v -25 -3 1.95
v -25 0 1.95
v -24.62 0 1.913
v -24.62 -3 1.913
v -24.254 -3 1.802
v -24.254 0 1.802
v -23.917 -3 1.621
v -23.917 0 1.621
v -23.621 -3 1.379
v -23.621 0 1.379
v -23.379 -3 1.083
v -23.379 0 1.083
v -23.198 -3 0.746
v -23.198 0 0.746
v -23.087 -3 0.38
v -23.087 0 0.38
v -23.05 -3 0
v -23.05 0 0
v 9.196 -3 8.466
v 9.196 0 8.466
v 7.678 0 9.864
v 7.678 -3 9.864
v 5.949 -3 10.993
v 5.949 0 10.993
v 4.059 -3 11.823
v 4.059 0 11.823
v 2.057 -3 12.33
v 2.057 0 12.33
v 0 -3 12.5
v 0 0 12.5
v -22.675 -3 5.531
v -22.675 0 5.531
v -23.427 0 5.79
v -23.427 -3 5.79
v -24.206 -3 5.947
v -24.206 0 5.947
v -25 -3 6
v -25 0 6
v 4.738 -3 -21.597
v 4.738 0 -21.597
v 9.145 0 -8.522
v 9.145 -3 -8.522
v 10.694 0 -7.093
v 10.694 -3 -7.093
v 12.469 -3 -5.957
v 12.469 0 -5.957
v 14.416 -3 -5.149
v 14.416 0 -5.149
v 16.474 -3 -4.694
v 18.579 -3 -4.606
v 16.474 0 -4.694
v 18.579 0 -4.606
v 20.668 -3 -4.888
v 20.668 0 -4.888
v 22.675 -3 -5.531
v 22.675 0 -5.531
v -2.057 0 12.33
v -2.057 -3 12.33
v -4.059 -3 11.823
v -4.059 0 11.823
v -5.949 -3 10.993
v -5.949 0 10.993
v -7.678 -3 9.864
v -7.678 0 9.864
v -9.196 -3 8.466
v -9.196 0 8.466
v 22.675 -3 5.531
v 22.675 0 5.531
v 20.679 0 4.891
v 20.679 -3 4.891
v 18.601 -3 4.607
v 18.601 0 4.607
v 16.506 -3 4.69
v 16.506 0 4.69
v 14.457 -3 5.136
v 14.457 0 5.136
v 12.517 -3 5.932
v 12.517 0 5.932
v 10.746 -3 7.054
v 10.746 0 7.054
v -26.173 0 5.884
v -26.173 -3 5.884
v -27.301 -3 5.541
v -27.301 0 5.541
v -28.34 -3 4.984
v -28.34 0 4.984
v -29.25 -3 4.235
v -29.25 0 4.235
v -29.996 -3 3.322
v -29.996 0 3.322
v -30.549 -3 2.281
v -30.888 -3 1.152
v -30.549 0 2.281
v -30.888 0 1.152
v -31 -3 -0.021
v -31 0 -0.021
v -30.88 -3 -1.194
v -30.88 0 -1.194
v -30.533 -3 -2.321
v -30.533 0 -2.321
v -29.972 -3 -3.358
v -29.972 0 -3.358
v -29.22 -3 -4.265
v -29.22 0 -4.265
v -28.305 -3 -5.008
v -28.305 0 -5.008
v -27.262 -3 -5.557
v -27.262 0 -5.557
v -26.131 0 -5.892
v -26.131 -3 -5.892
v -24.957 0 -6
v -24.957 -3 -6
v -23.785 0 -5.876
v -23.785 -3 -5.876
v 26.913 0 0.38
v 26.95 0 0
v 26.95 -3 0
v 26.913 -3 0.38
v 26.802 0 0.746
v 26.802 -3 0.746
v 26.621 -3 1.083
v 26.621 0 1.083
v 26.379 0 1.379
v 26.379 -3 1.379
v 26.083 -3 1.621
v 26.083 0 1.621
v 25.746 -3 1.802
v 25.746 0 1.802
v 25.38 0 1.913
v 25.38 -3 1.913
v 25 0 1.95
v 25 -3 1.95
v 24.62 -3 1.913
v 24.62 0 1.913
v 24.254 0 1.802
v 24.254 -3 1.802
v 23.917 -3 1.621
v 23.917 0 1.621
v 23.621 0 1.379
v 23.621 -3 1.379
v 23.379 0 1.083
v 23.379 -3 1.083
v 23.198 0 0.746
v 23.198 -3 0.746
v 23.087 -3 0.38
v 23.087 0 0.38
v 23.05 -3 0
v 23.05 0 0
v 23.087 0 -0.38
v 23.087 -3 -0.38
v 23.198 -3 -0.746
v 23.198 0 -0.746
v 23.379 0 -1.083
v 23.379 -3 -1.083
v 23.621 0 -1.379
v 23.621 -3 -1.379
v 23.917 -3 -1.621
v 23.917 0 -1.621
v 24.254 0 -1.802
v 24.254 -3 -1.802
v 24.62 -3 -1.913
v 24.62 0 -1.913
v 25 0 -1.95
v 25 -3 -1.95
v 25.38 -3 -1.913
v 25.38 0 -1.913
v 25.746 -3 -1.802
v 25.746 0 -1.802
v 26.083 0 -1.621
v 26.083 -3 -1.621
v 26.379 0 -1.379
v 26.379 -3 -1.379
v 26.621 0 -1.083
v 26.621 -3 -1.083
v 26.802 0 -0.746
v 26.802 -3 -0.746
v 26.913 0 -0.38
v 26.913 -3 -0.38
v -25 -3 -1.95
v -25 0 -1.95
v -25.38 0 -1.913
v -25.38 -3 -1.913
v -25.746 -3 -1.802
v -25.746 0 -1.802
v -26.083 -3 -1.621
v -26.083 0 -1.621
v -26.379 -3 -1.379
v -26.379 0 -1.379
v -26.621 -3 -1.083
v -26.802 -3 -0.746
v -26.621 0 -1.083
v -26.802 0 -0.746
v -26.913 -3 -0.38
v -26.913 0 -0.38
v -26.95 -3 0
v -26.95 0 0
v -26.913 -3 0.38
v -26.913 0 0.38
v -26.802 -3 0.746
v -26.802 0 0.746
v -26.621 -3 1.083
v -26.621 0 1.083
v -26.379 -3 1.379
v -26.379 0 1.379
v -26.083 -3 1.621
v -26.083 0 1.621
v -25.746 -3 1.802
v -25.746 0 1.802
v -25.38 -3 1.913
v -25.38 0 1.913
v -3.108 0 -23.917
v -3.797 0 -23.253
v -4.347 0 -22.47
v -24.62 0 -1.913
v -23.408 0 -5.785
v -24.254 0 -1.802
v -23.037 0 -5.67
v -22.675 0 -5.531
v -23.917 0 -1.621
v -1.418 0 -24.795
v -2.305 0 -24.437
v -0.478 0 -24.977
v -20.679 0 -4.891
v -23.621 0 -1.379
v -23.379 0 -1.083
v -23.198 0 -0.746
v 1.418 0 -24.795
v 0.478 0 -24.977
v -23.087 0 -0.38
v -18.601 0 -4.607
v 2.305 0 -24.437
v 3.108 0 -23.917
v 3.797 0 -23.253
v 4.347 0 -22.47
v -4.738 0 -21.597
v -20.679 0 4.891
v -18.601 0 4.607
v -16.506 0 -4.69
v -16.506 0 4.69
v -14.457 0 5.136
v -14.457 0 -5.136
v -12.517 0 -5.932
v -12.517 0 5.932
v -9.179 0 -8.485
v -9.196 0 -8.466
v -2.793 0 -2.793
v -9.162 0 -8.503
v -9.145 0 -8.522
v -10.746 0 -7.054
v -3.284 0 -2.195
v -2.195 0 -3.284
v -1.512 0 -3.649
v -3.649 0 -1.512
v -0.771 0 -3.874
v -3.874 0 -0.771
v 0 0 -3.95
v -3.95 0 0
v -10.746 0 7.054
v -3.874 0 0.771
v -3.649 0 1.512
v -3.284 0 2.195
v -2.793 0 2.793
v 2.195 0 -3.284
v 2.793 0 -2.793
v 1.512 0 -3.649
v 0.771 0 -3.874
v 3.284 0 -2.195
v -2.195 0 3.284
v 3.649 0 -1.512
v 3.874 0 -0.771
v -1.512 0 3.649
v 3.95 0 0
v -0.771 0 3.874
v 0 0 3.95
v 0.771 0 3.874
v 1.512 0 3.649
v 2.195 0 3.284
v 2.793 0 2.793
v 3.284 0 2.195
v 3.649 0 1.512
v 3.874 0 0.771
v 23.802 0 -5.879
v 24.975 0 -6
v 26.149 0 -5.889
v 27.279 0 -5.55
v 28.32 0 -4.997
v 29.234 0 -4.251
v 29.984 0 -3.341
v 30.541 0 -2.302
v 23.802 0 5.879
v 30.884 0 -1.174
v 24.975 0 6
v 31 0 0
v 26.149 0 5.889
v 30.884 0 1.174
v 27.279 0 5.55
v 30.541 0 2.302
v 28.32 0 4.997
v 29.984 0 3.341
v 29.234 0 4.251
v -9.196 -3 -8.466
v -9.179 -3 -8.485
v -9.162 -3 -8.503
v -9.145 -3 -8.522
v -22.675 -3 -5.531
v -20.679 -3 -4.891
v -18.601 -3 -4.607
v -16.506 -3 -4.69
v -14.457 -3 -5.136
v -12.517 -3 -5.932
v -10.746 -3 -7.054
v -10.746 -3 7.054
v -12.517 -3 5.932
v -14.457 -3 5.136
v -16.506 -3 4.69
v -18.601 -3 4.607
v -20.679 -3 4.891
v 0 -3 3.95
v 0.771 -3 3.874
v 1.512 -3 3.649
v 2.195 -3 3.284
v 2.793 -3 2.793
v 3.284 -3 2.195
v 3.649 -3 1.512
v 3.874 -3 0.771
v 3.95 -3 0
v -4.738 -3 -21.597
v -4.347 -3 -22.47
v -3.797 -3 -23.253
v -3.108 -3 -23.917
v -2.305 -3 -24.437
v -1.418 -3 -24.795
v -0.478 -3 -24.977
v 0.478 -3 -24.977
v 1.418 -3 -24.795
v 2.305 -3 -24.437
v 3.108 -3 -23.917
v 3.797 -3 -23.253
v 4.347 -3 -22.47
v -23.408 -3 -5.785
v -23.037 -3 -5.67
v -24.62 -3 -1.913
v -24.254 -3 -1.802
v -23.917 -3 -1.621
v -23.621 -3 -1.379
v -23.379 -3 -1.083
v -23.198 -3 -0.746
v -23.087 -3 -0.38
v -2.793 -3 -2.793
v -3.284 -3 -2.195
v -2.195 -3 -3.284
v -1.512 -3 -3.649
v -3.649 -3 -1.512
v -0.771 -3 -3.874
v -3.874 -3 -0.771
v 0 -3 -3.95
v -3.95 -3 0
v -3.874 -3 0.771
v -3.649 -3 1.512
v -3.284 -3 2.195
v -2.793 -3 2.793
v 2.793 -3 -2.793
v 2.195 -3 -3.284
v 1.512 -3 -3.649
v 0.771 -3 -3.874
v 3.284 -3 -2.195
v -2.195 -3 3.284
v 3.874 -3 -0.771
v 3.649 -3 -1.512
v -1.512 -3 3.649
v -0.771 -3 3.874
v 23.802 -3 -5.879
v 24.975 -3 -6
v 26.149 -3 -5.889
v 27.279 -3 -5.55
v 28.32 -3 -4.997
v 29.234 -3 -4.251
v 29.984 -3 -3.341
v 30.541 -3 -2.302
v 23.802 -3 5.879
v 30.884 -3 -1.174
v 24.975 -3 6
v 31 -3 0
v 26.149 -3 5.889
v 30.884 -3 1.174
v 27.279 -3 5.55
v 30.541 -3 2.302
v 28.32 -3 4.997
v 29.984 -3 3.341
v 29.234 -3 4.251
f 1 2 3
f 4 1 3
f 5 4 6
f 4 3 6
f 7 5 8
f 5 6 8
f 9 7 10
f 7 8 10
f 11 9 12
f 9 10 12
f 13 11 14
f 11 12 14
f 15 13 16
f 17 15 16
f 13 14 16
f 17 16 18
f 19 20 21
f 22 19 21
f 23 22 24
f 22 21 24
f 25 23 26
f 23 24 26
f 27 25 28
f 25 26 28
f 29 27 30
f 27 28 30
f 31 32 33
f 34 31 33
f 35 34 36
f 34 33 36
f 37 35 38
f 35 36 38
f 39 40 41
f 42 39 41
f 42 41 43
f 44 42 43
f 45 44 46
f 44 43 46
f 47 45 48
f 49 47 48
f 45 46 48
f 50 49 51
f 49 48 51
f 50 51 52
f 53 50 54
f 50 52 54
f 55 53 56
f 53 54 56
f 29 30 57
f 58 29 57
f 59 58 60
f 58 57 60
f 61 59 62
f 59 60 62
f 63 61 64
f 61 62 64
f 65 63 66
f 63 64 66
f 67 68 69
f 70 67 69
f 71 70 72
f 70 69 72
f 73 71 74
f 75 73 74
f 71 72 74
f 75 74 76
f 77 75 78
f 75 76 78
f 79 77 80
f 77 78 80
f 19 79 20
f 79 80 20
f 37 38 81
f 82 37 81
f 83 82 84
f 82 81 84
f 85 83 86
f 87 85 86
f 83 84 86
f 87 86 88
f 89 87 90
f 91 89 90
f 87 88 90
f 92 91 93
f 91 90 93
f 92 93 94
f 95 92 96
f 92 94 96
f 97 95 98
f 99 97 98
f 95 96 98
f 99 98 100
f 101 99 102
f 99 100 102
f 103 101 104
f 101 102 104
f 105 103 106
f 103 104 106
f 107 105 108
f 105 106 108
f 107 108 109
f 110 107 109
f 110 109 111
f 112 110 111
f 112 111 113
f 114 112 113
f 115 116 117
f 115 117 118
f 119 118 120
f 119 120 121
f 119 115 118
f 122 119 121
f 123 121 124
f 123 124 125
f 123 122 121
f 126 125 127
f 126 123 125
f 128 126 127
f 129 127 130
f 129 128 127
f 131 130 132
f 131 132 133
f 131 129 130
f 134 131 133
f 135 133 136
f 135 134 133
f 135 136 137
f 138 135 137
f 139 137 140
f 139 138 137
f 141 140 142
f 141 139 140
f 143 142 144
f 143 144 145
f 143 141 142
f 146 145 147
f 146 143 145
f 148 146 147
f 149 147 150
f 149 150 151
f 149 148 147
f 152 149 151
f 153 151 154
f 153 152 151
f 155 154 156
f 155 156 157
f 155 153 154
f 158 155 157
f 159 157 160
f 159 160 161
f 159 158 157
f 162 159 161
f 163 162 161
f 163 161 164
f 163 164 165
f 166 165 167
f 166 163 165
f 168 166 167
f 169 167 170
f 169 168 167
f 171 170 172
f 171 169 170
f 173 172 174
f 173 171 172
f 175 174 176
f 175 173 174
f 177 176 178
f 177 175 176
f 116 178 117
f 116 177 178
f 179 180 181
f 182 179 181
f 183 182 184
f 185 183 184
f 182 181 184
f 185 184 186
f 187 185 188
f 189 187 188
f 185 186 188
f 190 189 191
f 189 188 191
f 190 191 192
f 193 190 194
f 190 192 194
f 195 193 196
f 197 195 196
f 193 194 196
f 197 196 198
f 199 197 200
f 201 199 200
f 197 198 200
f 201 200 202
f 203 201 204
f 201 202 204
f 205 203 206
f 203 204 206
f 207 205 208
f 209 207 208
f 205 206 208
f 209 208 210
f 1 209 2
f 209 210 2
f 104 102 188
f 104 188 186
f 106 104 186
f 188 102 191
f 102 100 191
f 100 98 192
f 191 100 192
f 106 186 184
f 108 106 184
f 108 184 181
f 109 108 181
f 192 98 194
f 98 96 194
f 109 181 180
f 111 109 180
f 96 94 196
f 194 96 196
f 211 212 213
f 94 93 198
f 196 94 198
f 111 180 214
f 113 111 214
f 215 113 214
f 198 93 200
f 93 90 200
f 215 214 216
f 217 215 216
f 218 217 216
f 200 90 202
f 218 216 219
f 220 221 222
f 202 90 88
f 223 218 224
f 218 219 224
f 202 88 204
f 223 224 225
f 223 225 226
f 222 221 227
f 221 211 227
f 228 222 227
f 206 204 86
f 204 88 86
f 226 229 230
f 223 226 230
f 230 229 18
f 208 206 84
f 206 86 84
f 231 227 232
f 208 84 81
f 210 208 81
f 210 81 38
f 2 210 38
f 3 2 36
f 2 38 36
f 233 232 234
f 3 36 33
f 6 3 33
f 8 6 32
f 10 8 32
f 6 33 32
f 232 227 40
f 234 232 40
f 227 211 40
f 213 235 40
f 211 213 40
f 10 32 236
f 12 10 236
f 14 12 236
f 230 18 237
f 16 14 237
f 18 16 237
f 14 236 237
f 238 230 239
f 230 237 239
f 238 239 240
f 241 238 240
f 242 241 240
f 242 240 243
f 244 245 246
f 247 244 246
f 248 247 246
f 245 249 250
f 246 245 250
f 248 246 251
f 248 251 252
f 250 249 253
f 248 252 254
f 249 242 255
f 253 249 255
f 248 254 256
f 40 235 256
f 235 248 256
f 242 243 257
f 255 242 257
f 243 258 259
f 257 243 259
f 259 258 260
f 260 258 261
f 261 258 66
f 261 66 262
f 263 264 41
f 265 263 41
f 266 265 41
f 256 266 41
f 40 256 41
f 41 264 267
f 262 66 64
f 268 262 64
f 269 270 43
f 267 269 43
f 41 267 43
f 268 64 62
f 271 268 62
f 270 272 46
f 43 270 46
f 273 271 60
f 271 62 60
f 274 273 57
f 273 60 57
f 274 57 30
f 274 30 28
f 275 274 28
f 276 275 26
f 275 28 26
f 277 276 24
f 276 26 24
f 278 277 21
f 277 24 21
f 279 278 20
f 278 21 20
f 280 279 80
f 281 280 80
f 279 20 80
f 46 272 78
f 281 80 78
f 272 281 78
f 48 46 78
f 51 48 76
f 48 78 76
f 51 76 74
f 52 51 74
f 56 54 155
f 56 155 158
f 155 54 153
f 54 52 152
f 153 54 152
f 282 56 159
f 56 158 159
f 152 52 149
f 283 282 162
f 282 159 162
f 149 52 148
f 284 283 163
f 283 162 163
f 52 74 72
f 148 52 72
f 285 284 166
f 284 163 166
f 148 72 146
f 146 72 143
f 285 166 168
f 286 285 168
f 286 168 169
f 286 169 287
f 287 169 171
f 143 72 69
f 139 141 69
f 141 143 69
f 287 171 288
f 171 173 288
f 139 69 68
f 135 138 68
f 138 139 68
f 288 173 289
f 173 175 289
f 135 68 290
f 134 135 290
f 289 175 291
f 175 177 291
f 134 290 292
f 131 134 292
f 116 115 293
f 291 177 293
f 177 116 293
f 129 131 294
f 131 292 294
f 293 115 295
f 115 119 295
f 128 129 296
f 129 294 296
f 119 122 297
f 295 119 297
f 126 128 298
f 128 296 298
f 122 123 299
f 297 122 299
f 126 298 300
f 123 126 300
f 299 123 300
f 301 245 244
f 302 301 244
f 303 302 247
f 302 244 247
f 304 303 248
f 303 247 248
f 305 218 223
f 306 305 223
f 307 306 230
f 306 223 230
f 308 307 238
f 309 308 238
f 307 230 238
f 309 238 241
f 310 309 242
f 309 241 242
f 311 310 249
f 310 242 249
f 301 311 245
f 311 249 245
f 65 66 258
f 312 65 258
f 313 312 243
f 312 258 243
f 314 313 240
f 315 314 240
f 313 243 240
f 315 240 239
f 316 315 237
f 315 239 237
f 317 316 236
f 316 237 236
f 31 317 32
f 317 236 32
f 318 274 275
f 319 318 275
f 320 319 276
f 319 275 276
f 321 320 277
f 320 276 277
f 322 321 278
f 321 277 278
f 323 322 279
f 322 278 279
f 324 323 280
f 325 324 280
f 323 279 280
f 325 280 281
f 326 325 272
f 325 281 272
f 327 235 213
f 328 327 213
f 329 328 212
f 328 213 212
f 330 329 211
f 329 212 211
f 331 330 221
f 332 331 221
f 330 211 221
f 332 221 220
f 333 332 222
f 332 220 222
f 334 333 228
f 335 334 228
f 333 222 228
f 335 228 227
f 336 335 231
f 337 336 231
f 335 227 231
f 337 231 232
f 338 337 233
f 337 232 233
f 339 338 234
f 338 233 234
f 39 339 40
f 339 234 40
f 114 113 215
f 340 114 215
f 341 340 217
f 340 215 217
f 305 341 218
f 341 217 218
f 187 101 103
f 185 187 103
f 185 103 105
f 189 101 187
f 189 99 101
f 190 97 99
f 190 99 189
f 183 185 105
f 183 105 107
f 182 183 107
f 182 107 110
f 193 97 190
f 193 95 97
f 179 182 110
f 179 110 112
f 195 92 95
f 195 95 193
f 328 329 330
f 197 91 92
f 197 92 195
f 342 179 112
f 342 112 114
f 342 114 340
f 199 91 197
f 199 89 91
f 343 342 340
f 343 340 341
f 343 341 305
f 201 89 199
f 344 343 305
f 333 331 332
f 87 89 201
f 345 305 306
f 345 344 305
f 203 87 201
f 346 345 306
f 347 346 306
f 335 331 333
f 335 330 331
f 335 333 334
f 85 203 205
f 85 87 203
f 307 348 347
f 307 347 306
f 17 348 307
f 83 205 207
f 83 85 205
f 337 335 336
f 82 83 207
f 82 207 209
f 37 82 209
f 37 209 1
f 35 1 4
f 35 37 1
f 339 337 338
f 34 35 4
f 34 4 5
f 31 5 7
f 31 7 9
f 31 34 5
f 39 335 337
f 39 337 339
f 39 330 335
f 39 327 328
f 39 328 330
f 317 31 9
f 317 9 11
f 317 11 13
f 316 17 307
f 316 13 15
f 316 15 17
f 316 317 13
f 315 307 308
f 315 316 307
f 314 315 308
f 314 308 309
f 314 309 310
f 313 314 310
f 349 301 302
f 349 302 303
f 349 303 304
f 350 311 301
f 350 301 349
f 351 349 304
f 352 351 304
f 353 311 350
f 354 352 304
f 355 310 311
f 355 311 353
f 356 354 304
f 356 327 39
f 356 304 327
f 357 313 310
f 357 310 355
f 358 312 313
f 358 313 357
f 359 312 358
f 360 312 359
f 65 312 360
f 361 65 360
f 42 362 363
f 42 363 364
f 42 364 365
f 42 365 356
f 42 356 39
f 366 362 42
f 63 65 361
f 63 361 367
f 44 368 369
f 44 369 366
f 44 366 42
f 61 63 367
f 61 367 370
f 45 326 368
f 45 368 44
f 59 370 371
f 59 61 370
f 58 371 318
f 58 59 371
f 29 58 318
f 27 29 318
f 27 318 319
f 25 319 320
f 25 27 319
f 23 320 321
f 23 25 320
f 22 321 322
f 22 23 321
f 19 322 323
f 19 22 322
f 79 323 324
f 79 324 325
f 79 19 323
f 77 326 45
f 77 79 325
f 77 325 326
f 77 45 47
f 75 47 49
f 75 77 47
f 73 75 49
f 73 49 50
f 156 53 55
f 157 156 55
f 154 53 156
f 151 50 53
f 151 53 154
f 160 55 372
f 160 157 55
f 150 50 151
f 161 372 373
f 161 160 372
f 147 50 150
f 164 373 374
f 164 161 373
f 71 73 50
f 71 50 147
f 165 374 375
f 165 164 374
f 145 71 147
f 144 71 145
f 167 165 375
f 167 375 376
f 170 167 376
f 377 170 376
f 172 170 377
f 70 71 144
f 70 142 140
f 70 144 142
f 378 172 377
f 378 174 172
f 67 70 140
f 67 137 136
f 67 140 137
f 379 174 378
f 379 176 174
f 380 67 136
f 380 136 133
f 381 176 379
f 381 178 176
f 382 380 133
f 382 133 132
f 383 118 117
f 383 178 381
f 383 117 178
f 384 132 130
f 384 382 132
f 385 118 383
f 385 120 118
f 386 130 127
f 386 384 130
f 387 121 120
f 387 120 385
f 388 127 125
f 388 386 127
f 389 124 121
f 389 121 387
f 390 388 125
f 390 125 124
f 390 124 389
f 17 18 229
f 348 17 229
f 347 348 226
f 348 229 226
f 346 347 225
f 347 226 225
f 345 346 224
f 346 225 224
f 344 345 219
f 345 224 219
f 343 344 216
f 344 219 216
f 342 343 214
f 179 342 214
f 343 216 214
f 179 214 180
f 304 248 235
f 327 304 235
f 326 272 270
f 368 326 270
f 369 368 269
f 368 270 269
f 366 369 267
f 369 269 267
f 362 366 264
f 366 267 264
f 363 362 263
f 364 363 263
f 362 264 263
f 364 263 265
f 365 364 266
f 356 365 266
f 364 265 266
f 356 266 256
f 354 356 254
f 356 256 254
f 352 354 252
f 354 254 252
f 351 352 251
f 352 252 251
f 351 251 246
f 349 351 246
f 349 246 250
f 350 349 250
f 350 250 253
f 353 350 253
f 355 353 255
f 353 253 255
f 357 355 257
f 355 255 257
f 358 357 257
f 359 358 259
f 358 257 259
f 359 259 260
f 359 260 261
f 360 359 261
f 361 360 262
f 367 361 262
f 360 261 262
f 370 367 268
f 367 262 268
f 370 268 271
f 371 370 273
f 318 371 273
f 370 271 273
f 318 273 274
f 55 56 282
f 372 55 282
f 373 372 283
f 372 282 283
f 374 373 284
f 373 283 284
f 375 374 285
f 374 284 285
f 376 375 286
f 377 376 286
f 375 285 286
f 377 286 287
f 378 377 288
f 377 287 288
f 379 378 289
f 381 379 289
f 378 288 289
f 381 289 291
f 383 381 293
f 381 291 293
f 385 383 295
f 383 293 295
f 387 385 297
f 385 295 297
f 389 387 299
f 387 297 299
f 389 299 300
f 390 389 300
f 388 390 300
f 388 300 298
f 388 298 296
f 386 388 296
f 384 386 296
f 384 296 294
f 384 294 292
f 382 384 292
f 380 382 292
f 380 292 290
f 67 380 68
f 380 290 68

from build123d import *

# Parameters (mm, degrees)
F0_R     = 1.95
F1_DEPTH = 3


with BuildPart() as f1:
    # F0 (on Front) → F1 (new body)
    with BuildSketch(Plane.XZ):
        with BuildLine():
            ThreePointArc((9.196429, 8.46615), (5.021111, 11.447202), (0, 12.5))
            ThreePointArc((0, 12.5), (-5.021111, 11.447202), (-9.196429, 8.46615))
            ThreePointArc((-9.196429, 8.46615), (-15.471851, 4.868407), (-22.675, 5.531218))
            ThreePointArc((-22.675, 5.531218), (-23.814106, 5.881637), (-25, 6))
            ThreePointArc((-25, 6), (-30.968842, -0.610671), (-23.785, -5.875694))
            ThreePointArc((-23.785, -5.875694), (-23.22164, -5.730396), (-22.675, -5.531218))
            ThreePointArc((-22.675, -5.531218), (-15.471851, -4.868407), (-9.196429, -8.46615))
            ThreePointArc((-9.196429, -8.46615), (-9.170756, -8.493952), (-9.145, -8.521677))
            ThreePointArc((-9.145, -8.521677), (-9.145117, -8.521895), (-9.145235, -8.522114))
            Line((-9.145235, -8.522114), (-4.73808, -21.597059))
            ThreePointArc((-4.73808, -21.597059), (0, -25), (4.73808, -21.597059))
            Line((4.73808, -21.597059), (9.145235, -8.522114))
            ThreePointArc((9.145235, -8.522114), (15.434808, -4.876534), (22.675, -5.531218))
            ThreePointArc((22.675, -5.531218), (31, 0), (22.675, 5.531218))
            ThreePointArc((22.675, 5.531218), (15.471851, 4.868407), (9.196429, 8.46615))
        make_face()
        with BuildLine():
            ThreePointArc((-25, -1.95), (-26.95, 0), (-25, 1.95))
            ThreePointArc((-25, 1.95), (-23.621142, 1.378858), (-23.05, 0))
            ThreePointArc((-23.05, 0), (-23.621142, -1.378858), (-25, -1.95))
        make_face(mode=Mode.SUBTRACT)
        with BuildLine():
            ThreePointArc((0, 3.95), (2.793072, 2.793072), (3.95, 0))
            ThreePointArc((3.95, 0), (-2.793072, -2.793072), (0, 3.95))
        make_face(mode=Mode.SUBTRACT)
        with Locations((25, 0)):
            Circle(F0_R, mode=Mode.SUBTRACT)
    extrude(amount=F1_DEPTH)


solid = f1.part
